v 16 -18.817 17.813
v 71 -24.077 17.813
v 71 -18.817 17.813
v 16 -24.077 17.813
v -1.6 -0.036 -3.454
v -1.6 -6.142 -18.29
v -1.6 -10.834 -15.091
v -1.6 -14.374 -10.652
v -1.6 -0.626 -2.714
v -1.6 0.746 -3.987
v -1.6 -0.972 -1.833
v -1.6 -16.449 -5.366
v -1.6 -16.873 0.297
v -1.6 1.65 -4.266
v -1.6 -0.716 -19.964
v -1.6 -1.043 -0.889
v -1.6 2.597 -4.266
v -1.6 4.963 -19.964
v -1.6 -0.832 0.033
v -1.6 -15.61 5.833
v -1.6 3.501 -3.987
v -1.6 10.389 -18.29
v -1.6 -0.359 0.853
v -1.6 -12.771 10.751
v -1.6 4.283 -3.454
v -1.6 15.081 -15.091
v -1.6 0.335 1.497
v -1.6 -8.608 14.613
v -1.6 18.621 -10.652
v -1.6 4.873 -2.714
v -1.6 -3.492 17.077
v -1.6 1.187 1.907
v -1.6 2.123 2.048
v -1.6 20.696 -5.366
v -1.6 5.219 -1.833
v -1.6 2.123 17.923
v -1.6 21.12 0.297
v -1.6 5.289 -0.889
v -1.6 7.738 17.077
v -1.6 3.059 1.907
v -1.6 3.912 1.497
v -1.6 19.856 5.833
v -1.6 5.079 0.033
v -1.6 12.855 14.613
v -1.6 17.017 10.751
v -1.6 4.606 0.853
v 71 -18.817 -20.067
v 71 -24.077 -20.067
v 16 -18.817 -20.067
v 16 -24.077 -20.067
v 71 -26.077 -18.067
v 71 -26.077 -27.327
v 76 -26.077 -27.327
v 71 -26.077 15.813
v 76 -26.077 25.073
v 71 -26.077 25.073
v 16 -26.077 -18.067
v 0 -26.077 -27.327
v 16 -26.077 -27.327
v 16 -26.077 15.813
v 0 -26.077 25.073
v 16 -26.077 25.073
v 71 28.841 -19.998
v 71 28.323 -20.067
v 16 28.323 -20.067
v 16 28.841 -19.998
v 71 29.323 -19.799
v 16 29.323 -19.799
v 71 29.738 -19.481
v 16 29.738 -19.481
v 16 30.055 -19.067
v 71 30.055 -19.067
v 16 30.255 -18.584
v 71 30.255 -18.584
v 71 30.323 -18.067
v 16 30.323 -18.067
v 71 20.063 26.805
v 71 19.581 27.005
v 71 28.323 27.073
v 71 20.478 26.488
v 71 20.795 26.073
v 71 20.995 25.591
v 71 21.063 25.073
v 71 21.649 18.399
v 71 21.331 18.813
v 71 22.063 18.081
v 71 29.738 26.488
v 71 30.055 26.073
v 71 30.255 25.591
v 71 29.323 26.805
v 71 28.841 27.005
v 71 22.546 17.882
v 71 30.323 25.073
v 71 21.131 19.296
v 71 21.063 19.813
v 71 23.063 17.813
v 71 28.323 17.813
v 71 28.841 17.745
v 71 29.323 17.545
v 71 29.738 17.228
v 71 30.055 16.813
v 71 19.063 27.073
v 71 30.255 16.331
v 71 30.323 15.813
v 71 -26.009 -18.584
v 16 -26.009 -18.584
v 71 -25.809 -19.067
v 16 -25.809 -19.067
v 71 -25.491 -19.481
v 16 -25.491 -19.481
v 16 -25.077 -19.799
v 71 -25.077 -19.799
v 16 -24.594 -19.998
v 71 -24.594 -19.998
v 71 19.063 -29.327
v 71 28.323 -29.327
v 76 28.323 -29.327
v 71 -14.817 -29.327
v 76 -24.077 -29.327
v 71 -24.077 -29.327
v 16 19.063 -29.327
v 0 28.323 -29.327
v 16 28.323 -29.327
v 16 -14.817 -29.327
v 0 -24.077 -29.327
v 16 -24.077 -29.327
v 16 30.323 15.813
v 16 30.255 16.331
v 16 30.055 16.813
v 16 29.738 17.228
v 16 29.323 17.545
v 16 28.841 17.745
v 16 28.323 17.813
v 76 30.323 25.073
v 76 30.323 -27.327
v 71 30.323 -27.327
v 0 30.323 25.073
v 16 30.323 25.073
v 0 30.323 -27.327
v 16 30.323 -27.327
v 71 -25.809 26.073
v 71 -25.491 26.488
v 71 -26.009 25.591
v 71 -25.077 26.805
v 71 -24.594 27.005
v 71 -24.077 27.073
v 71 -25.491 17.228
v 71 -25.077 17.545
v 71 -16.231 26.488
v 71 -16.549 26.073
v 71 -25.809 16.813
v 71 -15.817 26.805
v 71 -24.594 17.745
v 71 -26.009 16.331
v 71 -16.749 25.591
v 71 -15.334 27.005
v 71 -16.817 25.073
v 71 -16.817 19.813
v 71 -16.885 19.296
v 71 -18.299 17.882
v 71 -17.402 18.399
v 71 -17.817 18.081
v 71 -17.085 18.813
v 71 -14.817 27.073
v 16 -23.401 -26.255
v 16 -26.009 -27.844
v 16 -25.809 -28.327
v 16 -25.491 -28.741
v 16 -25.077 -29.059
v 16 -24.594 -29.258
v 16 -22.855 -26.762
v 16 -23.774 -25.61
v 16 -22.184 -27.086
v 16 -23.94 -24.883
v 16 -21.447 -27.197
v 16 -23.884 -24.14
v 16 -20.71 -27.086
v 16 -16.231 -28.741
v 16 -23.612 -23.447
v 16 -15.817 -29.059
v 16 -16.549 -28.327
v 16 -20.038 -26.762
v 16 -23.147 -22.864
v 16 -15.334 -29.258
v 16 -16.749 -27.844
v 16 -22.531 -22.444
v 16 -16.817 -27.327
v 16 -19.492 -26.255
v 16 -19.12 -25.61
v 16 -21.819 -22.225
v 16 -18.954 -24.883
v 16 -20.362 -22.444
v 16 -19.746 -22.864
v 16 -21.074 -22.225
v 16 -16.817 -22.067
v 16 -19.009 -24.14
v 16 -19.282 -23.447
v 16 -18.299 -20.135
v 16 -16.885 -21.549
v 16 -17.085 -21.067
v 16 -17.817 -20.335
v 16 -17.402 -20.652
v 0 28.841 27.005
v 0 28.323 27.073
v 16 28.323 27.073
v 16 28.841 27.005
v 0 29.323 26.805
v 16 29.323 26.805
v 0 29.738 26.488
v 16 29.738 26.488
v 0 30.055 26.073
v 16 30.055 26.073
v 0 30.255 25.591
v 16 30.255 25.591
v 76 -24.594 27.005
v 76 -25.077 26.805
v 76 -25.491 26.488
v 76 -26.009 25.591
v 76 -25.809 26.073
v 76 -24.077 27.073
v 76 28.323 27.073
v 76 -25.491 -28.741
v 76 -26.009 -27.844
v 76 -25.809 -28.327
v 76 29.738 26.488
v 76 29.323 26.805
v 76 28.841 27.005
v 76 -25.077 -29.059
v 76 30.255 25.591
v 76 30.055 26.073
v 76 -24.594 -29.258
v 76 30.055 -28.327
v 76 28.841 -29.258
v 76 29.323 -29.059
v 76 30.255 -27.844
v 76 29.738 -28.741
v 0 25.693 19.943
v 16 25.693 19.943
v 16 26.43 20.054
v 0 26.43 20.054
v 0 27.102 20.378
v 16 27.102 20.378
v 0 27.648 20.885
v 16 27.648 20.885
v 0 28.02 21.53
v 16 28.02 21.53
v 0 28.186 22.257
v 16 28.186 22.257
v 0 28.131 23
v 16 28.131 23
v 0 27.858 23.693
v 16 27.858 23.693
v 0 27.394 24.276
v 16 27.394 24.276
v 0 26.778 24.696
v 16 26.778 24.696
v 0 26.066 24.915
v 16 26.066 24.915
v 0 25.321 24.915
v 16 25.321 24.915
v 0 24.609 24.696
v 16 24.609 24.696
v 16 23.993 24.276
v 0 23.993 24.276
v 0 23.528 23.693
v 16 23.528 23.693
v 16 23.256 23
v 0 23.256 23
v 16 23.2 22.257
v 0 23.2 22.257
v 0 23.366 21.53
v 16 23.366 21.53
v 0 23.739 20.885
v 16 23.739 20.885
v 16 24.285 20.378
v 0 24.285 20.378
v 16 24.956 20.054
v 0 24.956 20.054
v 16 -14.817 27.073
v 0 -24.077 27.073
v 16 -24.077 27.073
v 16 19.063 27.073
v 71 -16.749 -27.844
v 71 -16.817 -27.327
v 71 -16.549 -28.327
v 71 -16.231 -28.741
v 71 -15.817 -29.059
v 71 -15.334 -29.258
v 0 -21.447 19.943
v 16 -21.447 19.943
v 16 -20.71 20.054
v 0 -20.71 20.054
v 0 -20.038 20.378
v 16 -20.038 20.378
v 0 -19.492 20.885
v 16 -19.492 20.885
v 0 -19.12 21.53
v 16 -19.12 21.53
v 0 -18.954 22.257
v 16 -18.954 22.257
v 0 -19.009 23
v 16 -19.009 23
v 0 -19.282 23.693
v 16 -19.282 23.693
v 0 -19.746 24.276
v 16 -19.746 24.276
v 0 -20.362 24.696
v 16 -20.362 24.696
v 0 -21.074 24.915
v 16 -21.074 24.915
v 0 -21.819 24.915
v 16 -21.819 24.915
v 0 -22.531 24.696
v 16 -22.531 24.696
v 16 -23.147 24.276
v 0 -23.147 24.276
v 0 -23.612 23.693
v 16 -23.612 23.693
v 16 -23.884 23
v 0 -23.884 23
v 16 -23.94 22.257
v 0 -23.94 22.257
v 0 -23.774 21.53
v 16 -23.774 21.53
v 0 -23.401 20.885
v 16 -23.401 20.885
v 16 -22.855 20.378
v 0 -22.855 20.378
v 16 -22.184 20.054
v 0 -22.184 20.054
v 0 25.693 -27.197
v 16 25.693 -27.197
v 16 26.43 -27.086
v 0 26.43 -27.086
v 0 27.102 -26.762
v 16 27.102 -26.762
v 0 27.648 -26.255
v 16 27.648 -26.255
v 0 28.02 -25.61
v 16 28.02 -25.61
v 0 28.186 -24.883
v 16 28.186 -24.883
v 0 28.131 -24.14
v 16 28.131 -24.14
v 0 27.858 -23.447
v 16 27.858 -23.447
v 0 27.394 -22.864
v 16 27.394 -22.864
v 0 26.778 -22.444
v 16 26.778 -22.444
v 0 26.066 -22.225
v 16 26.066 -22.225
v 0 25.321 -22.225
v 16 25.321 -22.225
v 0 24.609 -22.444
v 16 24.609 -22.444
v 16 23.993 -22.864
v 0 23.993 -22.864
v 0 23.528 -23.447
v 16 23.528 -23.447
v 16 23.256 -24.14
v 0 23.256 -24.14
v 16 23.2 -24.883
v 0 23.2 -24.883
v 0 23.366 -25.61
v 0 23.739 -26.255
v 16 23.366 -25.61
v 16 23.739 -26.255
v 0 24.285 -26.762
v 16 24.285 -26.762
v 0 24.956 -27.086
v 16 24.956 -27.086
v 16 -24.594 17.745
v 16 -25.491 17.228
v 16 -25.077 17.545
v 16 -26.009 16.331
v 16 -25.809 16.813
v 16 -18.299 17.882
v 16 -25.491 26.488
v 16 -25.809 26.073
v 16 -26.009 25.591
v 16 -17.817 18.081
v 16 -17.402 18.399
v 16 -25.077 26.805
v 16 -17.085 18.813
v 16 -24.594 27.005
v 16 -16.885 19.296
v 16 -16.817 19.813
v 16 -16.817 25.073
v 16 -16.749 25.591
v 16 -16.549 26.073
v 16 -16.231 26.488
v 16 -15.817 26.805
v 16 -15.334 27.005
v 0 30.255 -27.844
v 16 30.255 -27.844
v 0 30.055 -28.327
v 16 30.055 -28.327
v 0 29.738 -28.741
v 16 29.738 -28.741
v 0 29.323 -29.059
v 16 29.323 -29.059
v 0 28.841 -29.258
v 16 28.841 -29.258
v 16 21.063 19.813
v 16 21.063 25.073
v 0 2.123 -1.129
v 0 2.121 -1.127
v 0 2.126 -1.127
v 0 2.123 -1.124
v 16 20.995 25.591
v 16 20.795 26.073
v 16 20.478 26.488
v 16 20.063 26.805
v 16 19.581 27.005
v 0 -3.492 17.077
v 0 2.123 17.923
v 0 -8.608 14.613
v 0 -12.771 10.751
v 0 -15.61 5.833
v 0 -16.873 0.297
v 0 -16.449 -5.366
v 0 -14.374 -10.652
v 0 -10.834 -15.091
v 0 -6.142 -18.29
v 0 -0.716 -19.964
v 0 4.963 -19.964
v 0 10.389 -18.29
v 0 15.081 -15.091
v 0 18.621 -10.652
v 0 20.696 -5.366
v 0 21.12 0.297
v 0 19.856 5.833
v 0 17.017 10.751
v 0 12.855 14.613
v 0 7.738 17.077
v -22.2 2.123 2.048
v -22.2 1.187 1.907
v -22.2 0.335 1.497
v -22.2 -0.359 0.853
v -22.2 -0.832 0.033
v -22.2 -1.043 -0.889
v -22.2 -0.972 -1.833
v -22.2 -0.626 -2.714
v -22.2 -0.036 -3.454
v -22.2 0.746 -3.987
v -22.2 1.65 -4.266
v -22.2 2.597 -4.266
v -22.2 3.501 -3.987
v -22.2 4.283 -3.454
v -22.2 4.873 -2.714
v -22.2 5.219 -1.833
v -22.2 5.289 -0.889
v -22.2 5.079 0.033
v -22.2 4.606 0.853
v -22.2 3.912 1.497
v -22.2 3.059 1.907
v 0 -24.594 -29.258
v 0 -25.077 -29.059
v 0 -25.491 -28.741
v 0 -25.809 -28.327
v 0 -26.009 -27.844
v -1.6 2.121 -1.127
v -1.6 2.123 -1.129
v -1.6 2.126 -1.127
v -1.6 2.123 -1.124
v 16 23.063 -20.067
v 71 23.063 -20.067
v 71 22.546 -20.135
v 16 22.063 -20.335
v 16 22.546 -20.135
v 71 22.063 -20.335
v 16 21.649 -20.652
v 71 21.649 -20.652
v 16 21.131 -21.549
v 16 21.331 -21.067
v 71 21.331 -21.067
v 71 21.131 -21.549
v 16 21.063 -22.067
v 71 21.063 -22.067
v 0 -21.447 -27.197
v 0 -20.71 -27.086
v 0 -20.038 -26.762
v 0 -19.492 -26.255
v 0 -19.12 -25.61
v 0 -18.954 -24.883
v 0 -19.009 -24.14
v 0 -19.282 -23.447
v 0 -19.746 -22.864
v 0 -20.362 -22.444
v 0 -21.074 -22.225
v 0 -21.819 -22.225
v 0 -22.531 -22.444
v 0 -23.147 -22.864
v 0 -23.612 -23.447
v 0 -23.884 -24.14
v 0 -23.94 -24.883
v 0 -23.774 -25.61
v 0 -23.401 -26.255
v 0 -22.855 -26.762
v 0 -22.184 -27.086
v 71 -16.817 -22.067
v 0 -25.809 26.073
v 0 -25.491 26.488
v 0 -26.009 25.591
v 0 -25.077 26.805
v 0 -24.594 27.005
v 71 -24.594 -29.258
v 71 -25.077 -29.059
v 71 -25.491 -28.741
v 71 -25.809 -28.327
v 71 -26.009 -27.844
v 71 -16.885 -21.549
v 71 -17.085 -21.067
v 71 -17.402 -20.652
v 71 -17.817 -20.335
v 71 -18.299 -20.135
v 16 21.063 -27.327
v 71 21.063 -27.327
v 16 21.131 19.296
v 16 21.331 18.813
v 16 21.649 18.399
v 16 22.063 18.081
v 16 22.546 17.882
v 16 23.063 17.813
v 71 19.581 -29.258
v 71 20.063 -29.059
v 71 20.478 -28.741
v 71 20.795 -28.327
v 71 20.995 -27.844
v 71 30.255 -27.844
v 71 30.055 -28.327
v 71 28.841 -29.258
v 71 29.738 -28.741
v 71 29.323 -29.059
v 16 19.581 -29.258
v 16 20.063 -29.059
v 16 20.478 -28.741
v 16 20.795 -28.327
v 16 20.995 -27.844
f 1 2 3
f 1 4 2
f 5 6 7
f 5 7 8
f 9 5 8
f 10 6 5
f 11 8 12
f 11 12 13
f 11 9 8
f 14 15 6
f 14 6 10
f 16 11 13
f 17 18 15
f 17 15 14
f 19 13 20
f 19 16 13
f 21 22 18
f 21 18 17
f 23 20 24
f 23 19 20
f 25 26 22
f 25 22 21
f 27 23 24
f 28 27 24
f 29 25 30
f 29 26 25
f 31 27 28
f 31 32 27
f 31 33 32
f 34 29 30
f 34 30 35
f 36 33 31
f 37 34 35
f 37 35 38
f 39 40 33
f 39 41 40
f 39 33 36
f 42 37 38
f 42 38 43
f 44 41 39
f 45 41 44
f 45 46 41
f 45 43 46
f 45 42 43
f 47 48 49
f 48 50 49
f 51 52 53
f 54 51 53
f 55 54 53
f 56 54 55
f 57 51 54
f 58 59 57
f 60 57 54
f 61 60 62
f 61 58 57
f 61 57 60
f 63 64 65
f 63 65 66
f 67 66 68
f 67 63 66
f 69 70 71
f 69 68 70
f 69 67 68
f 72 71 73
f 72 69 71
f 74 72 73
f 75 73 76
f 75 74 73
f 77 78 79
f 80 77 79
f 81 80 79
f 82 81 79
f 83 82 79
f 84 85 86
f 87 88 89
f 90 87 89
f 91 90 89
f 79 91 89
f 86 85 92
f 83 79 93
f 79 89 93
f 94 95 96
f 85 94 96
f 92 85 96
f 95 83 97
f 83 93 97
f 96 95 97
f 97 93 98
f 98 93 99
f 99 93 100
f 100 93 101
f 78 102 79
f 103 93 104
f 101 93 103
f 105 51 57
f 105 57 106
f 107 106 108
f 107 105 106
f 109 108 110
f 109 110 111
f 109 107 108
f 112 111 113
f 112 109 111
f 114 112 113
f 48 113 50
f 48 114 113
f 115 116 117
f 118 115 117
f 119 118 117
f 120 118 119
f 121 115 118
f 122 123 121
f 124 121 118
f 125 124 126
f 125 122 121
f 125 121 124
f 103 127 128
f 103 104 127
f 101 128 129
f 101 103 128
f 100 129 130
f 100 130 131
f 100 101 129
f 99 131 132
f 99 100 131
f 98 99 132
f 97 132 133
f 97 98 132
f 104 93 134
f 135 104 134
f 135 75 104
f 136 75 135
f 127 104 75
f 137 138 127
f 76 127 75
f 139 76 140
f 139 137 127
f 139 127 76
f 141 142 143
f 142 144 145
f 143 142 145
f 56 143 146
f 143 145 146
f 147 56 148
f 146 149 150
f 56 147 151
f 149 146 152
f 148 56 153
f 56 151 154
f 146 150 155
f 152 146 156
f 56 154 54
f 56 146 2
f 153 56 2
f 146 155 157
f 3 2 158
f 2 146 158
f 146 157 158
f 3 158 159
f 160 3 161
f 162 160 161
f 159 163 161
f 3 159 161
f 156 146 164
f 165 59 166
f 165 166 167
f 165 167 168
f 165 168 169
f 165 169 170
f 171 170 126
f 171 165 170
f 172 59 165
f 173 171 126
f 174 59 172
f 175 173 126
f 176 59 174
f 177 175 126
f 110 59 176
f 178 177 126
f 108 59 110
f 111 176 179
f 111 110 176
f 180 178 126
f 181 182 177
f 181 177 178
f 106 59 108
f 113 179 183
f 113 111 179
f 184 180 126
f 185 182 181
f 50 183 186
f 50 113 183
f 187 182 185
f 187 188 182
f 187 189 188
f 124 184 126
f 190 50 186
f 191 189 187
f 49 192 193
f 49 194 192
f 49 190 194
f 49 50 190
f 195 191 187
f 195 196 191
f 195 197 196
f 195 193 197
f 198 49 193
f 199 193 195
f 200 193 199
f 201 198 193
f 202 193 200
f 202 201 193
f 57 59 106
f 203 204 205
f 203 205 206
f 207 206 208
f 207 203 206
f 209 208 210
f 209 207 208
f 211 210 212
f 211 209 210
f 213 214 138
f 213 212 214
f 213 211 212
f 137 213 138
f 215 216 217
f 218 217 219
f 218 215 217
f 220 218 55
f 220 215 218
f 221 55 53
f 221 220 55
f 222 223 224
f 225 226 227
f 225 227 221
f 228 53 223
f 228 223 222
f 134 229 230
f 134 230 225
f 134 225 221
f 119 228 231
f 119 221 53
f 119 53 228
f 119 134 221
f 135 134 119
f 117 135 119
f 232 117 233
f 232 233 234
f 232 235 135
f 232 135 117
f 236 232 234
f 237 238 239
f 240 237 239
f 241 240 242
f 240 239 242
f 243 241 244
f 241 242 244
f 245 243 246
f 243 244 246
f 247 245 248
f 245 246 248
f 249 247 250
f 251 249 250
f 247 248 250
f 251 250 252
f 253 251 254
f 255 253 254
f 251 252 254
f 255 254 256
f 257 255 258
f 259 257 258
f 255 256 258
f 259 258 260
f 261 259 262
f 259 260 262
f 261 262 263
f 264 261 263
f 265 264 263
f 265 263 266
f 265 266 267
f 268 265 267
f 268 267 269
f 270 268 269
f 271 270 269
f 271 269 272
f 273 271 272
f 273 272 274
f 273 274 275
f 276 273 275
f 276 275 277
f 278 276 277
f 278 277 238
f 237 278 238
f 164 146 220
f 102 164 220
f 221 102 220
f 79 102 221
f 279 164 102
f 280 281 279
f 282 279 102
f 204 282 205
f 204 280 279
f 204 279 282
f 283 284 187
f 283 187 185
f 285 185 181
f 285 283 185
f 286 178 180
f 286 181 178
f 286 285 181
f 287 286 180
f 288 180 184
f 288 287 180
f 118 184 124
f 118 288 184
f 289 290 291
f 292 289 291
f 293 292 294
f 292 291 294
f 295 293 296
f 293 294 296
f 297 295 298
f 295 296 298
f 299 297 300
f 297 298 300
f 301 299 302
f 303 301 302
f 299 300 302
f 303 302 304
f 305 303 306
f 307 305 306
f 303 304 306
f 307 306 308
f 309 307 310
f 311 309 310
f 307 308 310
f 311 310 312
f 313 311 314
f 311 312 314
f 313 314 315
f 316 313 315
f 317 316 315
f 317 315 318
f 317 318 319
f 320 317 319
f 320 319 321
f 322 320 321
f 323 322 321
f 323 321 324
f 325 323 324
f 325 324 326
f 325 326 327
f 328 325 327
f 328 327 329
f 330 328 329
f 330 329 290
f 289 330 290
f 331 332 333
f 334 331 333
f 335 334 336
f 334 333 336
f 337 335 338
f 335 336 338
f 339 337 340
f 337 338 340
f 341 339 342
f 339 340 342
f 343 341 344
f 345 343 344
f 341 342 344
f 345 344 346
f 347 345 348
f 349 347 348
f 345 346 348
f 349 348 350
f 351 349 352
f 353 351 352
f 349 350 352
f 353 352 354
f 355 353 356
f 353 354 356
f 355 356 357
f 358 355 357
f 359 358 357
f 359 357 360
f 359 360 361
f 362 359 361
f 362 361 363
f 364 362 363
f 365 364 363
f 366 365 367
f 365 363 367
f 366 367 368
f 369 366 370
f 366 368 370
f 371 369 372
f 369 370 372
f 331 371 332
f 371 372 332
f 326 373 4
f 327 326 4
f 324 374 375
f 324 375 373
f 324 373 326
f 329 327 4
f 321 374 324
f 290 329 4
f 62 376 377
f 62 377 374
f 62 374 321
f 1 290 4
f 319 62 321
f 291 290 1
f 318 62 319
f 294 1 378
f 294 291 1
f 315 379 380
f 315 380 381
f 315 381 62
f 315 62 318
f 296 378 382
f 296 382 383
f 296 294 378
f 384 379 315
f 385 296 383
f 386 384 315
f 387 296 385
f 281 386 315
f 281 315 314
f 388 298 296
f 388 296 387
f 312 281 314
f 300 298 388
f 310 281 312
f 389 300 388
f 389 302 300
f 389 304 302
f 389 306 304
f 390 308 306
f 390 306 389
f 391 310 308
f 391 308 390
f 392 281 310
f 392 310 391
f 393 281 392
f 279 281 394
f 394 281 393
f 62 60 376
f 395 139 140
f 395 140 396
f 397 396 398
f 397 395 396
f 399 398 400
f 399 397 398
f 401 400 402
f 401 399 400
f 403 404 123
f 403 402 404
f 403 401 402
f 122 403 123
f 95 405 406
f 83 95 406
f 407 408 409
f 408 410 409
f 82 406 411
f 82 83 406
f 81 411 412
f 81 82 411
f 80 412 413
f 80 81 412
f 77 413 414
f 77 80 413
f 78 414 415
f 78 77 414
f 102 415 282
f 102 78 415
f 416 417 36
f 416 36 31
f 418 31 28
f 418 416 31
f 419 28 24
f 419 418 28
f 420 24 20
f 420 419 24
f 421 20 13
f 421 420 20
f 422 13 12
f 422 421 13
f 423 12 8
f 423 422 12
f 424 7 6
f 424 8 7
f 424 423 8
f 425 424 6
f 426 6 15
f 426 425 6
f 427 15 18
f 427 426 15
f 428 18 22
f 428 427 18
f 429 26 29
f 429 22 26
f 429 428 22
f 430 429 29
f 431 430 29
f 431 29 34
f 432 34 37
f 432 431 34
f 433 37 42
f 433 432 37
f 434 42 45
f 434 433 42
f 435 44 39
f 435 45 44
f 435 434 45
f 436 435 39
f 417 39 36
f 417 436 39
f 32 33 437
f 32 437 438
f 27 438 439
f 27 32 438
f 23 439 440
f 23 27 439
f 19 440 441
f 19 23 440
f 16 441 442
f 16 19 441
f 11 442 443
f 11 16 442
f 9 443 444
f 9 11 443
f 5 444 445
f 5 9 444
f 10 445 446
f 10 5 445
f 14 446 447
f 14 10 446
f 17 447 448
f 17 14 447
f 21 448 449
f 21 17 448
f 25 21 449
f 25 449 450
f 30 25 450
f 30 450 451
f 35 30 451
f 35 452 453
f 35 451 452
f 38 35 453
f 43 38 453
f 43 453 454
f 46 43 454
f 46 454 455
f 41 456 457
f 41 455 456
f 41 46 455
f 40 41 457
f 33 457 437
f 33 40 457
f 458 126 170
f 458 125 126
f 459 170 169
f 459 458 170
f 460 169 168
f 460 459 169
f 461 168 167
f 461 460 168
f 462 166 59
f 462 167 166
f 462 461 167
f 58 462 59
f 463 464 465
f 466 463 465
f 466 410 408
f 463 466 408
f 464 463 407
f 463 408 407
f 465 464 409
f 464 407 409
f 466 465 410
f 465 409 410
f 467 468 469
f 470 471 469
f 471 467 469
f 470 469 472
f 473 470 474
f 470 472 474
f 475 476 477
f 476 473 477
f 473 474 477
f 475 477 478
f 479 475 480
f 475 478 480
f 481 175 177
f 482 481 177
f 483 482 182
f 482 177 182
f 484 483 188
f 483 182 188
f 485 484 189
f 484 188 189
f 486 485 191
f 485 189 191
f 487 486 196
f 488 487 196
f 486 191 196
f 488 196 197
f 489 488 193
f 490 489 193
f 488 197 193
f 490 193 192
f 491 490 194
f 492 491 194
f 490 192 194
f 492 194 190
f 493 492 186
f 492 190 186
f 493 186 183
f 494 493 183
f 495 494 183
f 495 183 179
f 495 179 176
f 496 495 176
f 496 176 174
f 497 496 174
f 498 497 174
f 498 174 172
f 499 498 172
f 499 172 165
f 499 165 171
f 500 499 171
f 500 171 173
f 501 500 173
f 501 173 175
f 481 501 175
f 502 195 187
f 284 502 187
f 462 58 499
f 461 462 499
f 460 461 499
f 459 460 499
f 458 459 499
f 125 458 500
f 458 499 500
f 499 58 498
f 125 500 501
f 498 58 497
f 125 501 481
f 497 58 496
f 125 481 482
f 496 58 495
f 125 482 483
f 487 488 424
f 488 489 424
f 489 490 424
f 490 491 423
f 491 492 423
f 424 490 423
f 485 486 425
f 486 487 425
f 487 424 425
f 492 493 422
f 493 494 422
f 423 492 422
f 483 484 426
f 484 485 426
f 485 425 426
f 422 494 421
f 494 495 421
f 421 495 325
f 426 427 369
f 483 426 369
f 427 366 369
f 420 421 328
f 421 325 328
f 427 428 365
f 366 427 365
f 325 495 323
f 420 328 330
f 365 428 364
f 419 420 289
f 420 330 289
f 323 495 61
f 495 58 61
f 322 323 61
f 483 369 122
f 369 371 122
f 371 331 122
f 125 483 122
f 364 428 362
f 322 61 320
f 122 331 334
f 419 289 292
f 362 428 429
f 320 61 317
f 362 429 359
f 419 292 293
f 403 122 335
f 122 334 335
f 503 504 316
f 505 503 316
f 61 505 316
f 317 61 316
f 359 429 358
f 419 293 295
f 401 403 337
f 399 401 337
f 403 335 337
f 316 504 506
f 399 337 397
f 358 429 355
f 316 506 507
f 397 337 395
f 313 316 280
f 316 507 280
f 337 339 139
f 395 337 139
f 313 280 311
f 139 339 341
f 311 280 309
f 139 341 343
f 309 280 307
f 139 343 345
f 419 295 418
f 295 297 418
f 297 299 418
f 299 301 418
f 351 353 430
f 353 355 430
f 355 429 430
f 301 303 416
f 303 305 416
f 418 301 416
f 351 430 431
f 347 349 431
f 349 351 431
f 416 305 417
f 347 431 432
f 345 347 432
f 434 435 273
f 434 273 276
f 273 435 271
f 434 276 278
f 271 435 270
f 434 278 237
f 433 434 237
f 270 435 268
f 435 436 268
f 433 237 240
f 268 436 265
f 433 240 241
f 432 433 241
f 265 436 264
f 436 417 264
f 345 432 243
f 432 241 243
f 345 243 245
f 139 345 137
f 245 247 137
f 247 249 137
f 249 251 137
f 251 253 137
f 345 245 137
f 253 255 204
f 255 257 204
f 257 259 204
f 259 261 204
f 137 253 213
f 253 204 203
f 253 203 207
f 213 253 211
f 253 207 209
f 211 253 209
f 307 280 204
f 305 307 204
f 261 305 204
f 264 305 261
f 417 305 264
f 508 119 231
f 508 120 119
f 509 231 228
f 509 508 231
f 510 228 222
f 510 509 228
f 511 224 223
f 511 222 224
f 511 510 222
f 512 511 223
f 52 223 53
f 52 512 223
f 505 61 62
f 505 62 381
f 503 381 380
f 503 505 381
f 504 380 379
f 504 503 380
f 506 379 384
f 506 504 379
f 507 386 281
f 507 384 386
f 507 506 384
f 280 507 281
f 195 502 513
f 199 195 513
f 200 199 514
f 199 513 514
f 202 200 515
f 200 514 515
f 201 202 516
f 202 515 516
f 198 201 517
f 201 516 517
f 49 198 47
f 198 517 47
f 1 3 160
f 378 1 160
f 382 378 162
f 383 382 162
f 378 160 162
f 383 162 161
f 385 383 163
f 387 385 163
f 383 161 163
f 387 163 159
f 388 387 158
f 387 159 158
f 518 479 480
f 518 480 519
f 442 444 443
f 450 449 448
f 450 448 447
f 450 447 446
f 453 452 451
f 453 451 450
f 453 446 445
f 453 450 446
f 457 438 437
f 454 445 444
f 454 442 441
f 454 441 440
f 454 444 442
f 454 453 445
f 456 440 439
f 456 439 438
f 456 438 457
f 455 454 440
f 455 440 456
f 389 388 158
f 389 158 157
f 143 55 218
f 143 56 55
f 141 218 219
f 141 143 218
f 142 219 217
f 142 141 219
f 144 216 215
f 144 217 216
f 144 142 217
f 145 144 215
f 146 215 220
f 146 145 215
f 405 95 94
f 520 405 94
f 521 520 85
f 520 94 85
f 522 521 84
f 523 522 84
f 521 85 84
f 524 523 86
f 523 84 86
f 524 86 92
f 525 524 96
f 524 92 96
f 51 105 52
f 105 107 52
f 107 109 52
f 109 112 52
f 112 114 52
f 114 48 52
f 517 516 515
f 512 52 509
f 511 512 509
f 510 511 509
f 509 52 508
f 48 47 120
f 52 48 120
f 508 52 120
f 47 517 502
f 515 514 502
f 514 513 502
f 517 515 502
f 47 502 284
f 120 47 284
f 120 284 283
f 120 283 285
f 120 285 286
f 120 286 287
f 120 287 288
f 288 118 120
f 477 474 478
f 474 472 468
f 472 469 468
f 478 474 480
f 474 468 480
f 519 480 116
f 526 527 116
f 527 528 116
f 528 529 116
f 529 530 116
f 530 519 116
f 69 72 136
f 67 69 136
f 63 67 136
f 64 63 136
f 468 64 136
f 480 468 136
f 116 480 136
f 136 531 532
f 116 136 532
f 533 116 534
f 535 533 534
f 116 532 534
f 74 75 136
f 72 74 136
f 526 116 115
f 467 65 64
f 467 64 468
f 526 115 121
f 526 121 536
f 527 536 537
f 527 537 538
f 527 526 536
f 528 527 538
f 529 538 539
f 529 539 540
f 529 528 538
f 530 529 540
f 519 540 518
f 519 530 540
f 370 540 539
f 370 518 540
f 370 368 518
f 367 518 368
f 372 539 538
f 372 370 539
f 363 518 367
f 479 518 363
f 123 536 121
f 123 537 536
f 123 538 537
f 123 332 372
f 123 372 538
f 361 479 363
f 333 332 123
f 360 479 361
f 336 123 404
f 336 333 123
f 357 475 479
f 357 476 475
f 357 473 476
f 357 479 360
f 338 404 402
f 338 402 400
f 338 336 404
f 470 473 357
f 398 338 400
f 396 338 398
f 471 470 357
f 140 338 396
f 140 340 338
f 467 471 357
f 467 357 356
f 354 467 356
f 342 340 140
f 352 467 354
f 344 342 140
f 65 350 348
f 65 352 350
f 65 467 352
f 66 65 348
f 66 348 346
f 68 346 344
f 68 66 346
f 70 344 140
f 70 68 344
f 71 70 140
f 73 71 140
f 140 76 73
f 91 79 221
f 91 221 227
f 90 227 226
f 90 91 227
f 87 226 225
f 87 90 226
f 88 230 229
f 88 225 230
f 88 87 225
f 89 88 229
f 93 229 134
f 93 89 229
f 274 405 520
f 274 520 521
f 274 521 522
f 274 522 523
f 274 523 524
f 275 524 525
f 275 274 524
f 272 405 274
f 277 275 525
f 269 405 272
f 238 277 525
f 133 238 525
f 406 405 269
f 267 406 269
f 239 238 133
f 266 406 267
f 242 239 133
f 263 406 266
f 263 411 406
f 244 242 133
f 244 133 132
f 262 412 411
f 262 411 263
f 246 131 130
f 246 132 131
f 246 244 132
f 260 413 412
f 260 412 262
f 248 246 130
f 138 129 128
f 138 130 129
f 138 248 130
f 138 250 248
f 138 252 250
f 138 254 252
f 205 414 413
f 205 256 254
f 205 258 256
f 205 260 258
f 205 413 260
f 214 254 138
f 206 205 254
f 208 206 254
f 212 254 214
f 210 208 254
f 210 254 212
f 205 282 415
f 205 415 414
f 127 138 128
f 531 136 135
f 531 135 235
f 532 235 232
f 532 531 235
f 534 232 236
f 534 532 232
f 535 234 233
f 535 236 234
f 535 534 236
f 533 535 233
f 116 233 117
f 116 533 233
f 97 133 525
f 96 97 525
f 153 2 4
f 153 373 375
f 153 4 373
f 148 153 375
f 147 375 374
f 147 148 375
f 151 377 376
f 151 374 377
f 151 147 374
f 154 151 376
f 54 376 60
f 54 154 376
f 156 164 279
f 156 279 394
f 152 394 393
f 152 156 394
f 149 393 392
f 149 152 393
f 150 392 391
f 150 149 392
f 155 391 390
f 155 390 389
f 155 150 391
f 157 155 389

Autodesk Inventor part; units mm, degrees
ref_plane "YZ Plane" through (0, 0, 0) normal (1, 0, 0) x (0, 1, 0)
ref_plane "XZ Plane" through (0, 0, 0) normal (0, 1, 0) x (-1, 0, 0)
ref_plane "XY Plane" through (0, 0, 0) normal (0, 0, 1) x (1, 0, 0)
sketch "Sketch1" plane through (0, 0, 0) normal (1, 0, 0) x (0, 1, 0)
  line L0 (28.3233, 27.0734) -> (-24.0767, 27.0734)
  line L1 (-26.0767, 25.0734) -> (-26.0767, -27.3266)
  line L2 (-24.0767, -29.3266) -> (28.3233, -29.3266)
  line L3 (30.3233, -27.3266) -> (30.3233, 25.0734)
  arc A0 (-24.0767, 27.0734) -> (-26.0767, 25.0734) centre (-24.0767, 25.0734) ccw
  arc A1 (30.3233, 25.0734) -> (28.3233, 27.0734) centre (28.3233, 25.0734) ccw
  arc A2 (28.3233, -29.3266) -> (30.3233, -27.3266) centre (28.3233, -27.3266) ccw
  arc A3 (-26.0767, -27.3266) -> (-24.0767, -29.3266) centre (-24.0767, -27.3266) ccw
  point P0 (0, 0)
  point P1 (30.3233, 27.0734)
  point P2 (-26.0767, -29.3266)
  point P3 (-26.0767, 27.0734)
  point P4 (30.3233, -29.3266)
  dimension "d0" = 56.4
  dimension "d1" = 56.4
  dimension "d18" = 2
extrude "Extrusion1" add sketch "Sketch1" along normal blind 16
sketch "Sketch5" plane through (16, 0, 0) normal (1, 0, 0) x (0, 0, -1)
  circle A0 centre (24.6966, 25.6933) radius 2.5
  circle A1 centre (24.6966, -21.4467) radius 2.5
  circle A2 centre (-22.4434, -21.4467) radius 2.5
  circle A3 centre (-22.4434, 25.6933) radius 2.5
  point P0 (0, 0)
  dimension "d38" = 5
  dimension "d39" = 5
  dimension "d40" = 5
  dimension "d41" = 5
extrude "Extrusion3" cut sketch "Sketch5" against normal blind 16
sketch "Sketch6" plane through (16, 0, 0) normal (1, 0, 0) x (0, 0, -1)
  line L0 (-25.0734, -26.0767) -> (27.3266, -26.0767) projected
  arc A0 (27.3266, -26.0767) -> (29.3266, -24.0767) centre (27.3266, -24.0767) ccw projected
  circle A1 centre (-22.4434, -21.4467) radius 2.5 projected
  circle A2 centre (24.6966, 25.6933) radius 2.5 projected
  circle A3 centre (24.6966, -21.4467) radius 2.5 projected
  circle A4 centre (-22.4434, 25.6933) radius 2.5 projected
  line L1 (-27.0734, 28.3233) -> (-27.0734, -24.0767) projected
  arc A5 (-27.0734, -24.0767) -> (-25.0734, -26.0767) centre (-25.0734, -24.0767) ccw projected
  line L2 (-25.0734, -26.0767) -> (27.3266, -26.0767) projected
  arc A6 (27.3266, -26.0767) -> (29.3266, -24.0767) centre (27.3266, -24.0767) ccw projected
  line L3 (29.3266, -24.0767) -> (29.3266, 28.3233) projected
  arc A7 (29.3266, 28.3233) -> (27.3266, 30.3233) centre (27.3266, 28.3233) ccw projected
  line L4 (27.3266, 30.3233) -> (-25.0734, 30.3233) projected
  arc A8 (-25.0734, 30.3233) -> (-27.0734, 28.3233) centre (-25.0734, 28.3233) ccw projected
  line L5 (20.0666, 30.3233) -> (20.0666, 21.0633)
  line L6 (20.0666, 21.0633) -> (29.3266, 21.0633)
  line L7 (20.0666, -26.0767) -> (20.0666, -16.8167)
  line L8 (20.0666, -16.8167) -> (29.3266, -16.8167)
  line L9 (-17.8134, 30.3233) -> (-17.8134, 21.0633)
  line L10 (-17.8134, 21.0633) -> (-27.0734, 21.0633)
  line L11 (-17.8134, -26.0767) -> (-17.8134, -16.8167)
  line L12 (-17.8134, -16.8167) -> (-27.0734, -16.8167)
  line L13 (29.3266, 21.0633) -> (29.3266, -16.8167)
  line L14 (20.0666, 30.3233) -> (-17.8134, 30.3233)
  line L15 (-25.0734, 30.3233) -> (27.3266, 30.3233) projected
  line L16 (-27.0734, 21.0633) -> (-27.0734, -16.8167)
  line L17 (-27.0734, -24.0767) -> (-27.0734, 28.3233) projected
  line L18 (20.0666, -26.0767) -> (-17.8134, -26.0767)
  line L19 (27.3266, -26.0767) -> (-25.0734, -26.0767) projected
  point P0 (0, 0)
  dimension "d44" = 9.26
  dimension "d45" = 9.26
  dimension "d46" = 9.26
  dimension "d47" = 9.26
  dimension "d48" = 9.26
  dimension "d49" = 9.26
  dimension "d50" = 9.26
  dimension "d51" = 9.26
extrude "Extrusion4" add sketch "Sketch6" along normal blind 55 contours L11 L12 L1 L10 L9 L4 L5 L6 L3 L8 L7 L0
sketch "Sketch7" plane through (71, 0, 0) normal (1, 0, 0) x (0, 0, -1)
  line L0 (27.3266, -26.0767) -> (-25.0734, -26.0767)
  line L1 (-27.0734, -24.0767) -> (-27.0734, 28.3233)
  line L2 (-25.0734, 30.3233) -> (27.3266, 30.3233)
  line L3 (29.3266, 28.3233) -> (29.3266, -24.0767)
  arc A0 (27.3266, -26.0767) -> (29.3266, -24.0767) centre (27.3266, -24.0767) ccw
  arc A1 (-27.0734, -24.0767) -> (-25.0734, -26.0767) centre (-25.0734, -24.0767) ccw
  arc A2 (-25.0734, 30.3233) -> (-27.0734, 28.3233) centre (-25.0734, 28.3233) ccw
  arc A3 (29.3266, 28.3233) -> (27.3266, 30.3233) centre (27.3266, 28.3233) ccw
  point P0 (0, 0)
  point P1 (-27.0734, 30.3233)
  point P2 (-27.0734, -26.0767)
  point P3 (29.3266, 30.3233)
  dimension "d54" = 56.4
  dimension "d55" = 56.4
  dimension "d56" = 2
extrude "Extrusion5" add sketch "Sketch7" along normal blind 5
fillet "Fillet1" radius 2 12 edges at (43.5, -16.8167, -29.3266) (43.5, -16.8167, -20.0666) (43.5, -26.0767, -20.0666) (43.5, -16.8167, 27.0734) (43.5, -16.8167, 17.8134) (43.5, -26.0767, 17.8134) (43.5, 21.0633, 27.0734) (43.5, 21.0633, 17.8134) (43.5, 30.3233, 17.8134) (43.5, 30.3233, -20.0666) (43.5, 21.0633, -20.0666) (43.5, 21.0633, -29.3266)
sketch "Sketch8" plane through (0, 0, 0) normal (-1, 0, 0) x (0, 0, 1)
  line L0 (-29.3266, 28.3233) -> (-29.3266, -24.0767) projected
  line L1 (-27.3266, -26.0767) -> (25.0734, -26.0767) projected
  line L2 (27.0734, -24.0767) -> (27.0734, 28.3233) projected
  line L3 (25.0734, 30.3233) -> (-27.3266, 30.3233) projected
  arc A0 (-27.3266, 30.3233) -> (-29.3266, 28.3233) centre (-27.3266, 28.3233) ccw projected
  arc A1 (27.0734, 28.3233) -> (25.0734, 30.3233) centre (25.0734, 28.3233) ccw projected
  arc A2 (25.0734, -26.0767) -> (27.0734, -24.0767) centre (25.0734, -24.0767) ccw projected
  circle A3 centre (-1.1266, 2.1233) radius 0.0027
  circle A4 centre (-1.1266, 2.1233) radius 19.05
  point P0 (0, 0)
  dimension "d60" = 38.1
extrude "Extrusion6" add sketch "Sketch8" along normal blind 1.6
sketch "Sketch9" plane through (-1.6, 2.1233, -1.1266) normal (-1, 0, 0) x (0, 0, 1)
  circle A0 centre (0, 0) radius 3.175
  point P0 (1.1266, -2.1233)
  dimension "d63" = 6.35
extrude "Extrusion7" add sketch "Sketch9" along normal blind 20.6
sketch "Sketch10" plane through (0, 0, 0) normal (-1, 0, 0) x (0, 0, 1)
  point P0 (0, 0)
properties part number "MOTOR"
